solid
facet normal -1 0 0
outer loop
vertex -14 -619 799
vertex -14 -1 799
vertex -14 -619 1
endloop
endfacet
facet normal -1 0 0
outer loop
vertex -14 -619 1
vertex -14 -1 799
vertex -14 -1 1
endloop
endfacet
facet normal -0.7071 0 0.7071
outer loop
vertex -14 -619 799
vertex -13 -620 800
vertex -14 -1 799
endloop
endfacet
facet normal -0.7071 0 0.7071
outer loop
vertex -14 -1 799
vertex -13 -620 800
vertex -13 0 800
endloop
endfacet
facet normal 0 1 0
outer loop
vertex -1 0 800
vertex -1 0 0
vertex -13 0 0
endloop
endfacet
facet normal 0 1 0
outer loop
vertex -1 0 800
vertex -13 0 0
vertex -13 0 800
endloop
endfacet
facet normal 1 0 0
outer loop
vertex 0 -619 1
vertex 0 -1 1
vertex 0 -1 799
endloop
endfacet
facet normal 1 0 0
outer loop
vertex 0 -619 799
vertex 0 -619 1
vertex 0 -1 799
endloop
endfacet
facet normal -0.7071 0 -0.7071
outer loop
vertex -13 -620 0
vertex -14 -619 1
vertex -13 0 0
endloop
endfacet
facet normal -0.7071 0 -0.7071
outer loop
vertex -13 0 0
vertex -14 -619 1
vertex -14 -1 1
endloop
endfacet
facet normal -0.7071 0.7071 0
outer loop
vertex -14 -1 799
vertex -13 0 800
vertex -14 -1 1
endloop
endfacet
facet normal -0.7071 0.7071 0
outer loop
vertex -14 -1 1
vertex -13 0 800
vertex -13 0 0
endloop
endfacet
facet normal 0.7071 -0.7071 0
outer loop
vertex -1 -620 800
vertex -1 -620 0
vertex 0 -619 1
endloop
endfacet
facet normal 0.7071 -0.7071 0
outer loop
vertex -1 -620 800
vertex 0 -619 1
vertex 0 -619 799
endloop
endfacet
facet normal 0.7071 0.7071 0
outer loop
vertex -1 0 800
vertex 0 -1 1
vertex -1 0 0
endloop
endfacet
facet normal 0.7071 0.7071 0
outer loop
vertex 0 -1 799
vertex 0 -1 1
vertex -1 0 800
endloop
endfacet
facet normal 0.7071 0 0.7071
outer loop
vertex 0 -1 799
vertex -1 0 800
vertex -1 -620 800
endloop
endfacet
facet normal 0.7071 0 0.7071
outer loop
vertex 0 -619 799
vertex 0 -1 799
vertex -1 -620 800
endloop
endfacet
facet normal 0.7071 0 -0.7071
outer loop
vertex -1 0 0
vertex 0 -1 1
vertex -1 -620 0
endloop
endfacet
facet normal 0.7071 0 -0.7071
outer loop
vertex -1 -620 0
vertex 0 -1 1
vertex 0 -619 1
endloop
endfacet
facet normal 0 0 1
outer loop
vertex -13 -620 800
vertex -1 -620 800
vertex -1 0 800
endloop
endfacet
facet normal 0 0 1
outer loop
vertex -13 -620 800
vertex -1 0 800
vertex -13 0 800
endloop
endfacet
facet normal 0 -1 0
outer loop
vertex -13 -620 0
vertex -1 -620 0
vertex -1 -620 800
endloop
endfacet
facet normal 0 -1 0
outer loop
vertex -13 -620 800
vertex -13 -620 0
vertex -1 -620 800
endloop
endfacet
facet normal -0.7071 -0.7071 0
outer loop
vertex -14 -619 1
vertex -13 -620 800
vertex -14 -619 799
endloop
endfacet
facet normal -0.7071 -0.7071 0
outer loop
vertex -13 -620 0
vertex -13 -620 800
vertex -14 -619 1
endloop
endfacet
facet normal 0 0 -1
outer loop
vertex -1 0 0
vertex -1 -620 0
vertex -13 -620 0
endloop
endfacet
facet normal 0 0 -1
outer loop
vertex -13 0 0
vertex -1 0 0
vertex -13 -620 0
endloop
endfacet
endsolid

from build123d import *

# Parameters (mm, degrees)
F0_W     = 50.6520830095
F0_H     = 38.2762104273
F1_DEPTH = 14
F2_DEPTH = 2200
F3_DEPTH = 620
F4_DEPTH = 400
F5_DEPTH = 1000
F6_SIZE  = 1


with BuildPart() as f1:
    # F0 (on Right) → F1 (new body)
    with BuildSketch(Plane.YZ):
        with Locations((-25.3260415047, 19.1381052136)):
            Rectangle(F0_W, F0_H)
    extrude(amount=-F1_DEPTH)

    # F2 (add): a face of the model
    f2_faces = [f1.faces().sort_by_distance(p)[0] for p in [
        (-7, -25.3260415047, 0),
    ]]
    extrude(f2_faces, amount=-F2_DEPTH)

    # F3 (add): a face of the model
    f3_faces = [f1.faces().sort_by_distance(p)[0] for p in [
        (-7, 0, 1100),
    ]]
    extrude(f3_faces, amount=-F3_DEPTH)

    # F4 (cut): a face of the model
    f4_faces = [f1.faces().sort_by_distance(p)[0] for p in [
        (-7, -310, 2200),
    ]]
    extrude(f4_faces, amount=-F4_DEPTH, mode=Mode.SUBTRACT)

    # F5 (cut): a face of the model
    f5_faces = [f1.faces().sort_by_distance(p)[0] for p in [
        (-7, -310, 1800),
    ]]
    extrude(f5_faces, amount=-F5_DEPTH, mode=Mode.SUBTRACT)

    # F6
    f6_edges = [f1.edges().sort_by_distance(p)[0] for p in [
        (0, -310, 0),
        (0, -620, 400),
        (0, -310, 800),
        (0, 0, 400),
        (-14, -620, 400),
        (-14, -310, 800),
        (-14, 0, 400),
        (-14, -310, 0),
    ]]
    chamfer(f6_edges, length=F6_SIZE)


solid = f1.part
